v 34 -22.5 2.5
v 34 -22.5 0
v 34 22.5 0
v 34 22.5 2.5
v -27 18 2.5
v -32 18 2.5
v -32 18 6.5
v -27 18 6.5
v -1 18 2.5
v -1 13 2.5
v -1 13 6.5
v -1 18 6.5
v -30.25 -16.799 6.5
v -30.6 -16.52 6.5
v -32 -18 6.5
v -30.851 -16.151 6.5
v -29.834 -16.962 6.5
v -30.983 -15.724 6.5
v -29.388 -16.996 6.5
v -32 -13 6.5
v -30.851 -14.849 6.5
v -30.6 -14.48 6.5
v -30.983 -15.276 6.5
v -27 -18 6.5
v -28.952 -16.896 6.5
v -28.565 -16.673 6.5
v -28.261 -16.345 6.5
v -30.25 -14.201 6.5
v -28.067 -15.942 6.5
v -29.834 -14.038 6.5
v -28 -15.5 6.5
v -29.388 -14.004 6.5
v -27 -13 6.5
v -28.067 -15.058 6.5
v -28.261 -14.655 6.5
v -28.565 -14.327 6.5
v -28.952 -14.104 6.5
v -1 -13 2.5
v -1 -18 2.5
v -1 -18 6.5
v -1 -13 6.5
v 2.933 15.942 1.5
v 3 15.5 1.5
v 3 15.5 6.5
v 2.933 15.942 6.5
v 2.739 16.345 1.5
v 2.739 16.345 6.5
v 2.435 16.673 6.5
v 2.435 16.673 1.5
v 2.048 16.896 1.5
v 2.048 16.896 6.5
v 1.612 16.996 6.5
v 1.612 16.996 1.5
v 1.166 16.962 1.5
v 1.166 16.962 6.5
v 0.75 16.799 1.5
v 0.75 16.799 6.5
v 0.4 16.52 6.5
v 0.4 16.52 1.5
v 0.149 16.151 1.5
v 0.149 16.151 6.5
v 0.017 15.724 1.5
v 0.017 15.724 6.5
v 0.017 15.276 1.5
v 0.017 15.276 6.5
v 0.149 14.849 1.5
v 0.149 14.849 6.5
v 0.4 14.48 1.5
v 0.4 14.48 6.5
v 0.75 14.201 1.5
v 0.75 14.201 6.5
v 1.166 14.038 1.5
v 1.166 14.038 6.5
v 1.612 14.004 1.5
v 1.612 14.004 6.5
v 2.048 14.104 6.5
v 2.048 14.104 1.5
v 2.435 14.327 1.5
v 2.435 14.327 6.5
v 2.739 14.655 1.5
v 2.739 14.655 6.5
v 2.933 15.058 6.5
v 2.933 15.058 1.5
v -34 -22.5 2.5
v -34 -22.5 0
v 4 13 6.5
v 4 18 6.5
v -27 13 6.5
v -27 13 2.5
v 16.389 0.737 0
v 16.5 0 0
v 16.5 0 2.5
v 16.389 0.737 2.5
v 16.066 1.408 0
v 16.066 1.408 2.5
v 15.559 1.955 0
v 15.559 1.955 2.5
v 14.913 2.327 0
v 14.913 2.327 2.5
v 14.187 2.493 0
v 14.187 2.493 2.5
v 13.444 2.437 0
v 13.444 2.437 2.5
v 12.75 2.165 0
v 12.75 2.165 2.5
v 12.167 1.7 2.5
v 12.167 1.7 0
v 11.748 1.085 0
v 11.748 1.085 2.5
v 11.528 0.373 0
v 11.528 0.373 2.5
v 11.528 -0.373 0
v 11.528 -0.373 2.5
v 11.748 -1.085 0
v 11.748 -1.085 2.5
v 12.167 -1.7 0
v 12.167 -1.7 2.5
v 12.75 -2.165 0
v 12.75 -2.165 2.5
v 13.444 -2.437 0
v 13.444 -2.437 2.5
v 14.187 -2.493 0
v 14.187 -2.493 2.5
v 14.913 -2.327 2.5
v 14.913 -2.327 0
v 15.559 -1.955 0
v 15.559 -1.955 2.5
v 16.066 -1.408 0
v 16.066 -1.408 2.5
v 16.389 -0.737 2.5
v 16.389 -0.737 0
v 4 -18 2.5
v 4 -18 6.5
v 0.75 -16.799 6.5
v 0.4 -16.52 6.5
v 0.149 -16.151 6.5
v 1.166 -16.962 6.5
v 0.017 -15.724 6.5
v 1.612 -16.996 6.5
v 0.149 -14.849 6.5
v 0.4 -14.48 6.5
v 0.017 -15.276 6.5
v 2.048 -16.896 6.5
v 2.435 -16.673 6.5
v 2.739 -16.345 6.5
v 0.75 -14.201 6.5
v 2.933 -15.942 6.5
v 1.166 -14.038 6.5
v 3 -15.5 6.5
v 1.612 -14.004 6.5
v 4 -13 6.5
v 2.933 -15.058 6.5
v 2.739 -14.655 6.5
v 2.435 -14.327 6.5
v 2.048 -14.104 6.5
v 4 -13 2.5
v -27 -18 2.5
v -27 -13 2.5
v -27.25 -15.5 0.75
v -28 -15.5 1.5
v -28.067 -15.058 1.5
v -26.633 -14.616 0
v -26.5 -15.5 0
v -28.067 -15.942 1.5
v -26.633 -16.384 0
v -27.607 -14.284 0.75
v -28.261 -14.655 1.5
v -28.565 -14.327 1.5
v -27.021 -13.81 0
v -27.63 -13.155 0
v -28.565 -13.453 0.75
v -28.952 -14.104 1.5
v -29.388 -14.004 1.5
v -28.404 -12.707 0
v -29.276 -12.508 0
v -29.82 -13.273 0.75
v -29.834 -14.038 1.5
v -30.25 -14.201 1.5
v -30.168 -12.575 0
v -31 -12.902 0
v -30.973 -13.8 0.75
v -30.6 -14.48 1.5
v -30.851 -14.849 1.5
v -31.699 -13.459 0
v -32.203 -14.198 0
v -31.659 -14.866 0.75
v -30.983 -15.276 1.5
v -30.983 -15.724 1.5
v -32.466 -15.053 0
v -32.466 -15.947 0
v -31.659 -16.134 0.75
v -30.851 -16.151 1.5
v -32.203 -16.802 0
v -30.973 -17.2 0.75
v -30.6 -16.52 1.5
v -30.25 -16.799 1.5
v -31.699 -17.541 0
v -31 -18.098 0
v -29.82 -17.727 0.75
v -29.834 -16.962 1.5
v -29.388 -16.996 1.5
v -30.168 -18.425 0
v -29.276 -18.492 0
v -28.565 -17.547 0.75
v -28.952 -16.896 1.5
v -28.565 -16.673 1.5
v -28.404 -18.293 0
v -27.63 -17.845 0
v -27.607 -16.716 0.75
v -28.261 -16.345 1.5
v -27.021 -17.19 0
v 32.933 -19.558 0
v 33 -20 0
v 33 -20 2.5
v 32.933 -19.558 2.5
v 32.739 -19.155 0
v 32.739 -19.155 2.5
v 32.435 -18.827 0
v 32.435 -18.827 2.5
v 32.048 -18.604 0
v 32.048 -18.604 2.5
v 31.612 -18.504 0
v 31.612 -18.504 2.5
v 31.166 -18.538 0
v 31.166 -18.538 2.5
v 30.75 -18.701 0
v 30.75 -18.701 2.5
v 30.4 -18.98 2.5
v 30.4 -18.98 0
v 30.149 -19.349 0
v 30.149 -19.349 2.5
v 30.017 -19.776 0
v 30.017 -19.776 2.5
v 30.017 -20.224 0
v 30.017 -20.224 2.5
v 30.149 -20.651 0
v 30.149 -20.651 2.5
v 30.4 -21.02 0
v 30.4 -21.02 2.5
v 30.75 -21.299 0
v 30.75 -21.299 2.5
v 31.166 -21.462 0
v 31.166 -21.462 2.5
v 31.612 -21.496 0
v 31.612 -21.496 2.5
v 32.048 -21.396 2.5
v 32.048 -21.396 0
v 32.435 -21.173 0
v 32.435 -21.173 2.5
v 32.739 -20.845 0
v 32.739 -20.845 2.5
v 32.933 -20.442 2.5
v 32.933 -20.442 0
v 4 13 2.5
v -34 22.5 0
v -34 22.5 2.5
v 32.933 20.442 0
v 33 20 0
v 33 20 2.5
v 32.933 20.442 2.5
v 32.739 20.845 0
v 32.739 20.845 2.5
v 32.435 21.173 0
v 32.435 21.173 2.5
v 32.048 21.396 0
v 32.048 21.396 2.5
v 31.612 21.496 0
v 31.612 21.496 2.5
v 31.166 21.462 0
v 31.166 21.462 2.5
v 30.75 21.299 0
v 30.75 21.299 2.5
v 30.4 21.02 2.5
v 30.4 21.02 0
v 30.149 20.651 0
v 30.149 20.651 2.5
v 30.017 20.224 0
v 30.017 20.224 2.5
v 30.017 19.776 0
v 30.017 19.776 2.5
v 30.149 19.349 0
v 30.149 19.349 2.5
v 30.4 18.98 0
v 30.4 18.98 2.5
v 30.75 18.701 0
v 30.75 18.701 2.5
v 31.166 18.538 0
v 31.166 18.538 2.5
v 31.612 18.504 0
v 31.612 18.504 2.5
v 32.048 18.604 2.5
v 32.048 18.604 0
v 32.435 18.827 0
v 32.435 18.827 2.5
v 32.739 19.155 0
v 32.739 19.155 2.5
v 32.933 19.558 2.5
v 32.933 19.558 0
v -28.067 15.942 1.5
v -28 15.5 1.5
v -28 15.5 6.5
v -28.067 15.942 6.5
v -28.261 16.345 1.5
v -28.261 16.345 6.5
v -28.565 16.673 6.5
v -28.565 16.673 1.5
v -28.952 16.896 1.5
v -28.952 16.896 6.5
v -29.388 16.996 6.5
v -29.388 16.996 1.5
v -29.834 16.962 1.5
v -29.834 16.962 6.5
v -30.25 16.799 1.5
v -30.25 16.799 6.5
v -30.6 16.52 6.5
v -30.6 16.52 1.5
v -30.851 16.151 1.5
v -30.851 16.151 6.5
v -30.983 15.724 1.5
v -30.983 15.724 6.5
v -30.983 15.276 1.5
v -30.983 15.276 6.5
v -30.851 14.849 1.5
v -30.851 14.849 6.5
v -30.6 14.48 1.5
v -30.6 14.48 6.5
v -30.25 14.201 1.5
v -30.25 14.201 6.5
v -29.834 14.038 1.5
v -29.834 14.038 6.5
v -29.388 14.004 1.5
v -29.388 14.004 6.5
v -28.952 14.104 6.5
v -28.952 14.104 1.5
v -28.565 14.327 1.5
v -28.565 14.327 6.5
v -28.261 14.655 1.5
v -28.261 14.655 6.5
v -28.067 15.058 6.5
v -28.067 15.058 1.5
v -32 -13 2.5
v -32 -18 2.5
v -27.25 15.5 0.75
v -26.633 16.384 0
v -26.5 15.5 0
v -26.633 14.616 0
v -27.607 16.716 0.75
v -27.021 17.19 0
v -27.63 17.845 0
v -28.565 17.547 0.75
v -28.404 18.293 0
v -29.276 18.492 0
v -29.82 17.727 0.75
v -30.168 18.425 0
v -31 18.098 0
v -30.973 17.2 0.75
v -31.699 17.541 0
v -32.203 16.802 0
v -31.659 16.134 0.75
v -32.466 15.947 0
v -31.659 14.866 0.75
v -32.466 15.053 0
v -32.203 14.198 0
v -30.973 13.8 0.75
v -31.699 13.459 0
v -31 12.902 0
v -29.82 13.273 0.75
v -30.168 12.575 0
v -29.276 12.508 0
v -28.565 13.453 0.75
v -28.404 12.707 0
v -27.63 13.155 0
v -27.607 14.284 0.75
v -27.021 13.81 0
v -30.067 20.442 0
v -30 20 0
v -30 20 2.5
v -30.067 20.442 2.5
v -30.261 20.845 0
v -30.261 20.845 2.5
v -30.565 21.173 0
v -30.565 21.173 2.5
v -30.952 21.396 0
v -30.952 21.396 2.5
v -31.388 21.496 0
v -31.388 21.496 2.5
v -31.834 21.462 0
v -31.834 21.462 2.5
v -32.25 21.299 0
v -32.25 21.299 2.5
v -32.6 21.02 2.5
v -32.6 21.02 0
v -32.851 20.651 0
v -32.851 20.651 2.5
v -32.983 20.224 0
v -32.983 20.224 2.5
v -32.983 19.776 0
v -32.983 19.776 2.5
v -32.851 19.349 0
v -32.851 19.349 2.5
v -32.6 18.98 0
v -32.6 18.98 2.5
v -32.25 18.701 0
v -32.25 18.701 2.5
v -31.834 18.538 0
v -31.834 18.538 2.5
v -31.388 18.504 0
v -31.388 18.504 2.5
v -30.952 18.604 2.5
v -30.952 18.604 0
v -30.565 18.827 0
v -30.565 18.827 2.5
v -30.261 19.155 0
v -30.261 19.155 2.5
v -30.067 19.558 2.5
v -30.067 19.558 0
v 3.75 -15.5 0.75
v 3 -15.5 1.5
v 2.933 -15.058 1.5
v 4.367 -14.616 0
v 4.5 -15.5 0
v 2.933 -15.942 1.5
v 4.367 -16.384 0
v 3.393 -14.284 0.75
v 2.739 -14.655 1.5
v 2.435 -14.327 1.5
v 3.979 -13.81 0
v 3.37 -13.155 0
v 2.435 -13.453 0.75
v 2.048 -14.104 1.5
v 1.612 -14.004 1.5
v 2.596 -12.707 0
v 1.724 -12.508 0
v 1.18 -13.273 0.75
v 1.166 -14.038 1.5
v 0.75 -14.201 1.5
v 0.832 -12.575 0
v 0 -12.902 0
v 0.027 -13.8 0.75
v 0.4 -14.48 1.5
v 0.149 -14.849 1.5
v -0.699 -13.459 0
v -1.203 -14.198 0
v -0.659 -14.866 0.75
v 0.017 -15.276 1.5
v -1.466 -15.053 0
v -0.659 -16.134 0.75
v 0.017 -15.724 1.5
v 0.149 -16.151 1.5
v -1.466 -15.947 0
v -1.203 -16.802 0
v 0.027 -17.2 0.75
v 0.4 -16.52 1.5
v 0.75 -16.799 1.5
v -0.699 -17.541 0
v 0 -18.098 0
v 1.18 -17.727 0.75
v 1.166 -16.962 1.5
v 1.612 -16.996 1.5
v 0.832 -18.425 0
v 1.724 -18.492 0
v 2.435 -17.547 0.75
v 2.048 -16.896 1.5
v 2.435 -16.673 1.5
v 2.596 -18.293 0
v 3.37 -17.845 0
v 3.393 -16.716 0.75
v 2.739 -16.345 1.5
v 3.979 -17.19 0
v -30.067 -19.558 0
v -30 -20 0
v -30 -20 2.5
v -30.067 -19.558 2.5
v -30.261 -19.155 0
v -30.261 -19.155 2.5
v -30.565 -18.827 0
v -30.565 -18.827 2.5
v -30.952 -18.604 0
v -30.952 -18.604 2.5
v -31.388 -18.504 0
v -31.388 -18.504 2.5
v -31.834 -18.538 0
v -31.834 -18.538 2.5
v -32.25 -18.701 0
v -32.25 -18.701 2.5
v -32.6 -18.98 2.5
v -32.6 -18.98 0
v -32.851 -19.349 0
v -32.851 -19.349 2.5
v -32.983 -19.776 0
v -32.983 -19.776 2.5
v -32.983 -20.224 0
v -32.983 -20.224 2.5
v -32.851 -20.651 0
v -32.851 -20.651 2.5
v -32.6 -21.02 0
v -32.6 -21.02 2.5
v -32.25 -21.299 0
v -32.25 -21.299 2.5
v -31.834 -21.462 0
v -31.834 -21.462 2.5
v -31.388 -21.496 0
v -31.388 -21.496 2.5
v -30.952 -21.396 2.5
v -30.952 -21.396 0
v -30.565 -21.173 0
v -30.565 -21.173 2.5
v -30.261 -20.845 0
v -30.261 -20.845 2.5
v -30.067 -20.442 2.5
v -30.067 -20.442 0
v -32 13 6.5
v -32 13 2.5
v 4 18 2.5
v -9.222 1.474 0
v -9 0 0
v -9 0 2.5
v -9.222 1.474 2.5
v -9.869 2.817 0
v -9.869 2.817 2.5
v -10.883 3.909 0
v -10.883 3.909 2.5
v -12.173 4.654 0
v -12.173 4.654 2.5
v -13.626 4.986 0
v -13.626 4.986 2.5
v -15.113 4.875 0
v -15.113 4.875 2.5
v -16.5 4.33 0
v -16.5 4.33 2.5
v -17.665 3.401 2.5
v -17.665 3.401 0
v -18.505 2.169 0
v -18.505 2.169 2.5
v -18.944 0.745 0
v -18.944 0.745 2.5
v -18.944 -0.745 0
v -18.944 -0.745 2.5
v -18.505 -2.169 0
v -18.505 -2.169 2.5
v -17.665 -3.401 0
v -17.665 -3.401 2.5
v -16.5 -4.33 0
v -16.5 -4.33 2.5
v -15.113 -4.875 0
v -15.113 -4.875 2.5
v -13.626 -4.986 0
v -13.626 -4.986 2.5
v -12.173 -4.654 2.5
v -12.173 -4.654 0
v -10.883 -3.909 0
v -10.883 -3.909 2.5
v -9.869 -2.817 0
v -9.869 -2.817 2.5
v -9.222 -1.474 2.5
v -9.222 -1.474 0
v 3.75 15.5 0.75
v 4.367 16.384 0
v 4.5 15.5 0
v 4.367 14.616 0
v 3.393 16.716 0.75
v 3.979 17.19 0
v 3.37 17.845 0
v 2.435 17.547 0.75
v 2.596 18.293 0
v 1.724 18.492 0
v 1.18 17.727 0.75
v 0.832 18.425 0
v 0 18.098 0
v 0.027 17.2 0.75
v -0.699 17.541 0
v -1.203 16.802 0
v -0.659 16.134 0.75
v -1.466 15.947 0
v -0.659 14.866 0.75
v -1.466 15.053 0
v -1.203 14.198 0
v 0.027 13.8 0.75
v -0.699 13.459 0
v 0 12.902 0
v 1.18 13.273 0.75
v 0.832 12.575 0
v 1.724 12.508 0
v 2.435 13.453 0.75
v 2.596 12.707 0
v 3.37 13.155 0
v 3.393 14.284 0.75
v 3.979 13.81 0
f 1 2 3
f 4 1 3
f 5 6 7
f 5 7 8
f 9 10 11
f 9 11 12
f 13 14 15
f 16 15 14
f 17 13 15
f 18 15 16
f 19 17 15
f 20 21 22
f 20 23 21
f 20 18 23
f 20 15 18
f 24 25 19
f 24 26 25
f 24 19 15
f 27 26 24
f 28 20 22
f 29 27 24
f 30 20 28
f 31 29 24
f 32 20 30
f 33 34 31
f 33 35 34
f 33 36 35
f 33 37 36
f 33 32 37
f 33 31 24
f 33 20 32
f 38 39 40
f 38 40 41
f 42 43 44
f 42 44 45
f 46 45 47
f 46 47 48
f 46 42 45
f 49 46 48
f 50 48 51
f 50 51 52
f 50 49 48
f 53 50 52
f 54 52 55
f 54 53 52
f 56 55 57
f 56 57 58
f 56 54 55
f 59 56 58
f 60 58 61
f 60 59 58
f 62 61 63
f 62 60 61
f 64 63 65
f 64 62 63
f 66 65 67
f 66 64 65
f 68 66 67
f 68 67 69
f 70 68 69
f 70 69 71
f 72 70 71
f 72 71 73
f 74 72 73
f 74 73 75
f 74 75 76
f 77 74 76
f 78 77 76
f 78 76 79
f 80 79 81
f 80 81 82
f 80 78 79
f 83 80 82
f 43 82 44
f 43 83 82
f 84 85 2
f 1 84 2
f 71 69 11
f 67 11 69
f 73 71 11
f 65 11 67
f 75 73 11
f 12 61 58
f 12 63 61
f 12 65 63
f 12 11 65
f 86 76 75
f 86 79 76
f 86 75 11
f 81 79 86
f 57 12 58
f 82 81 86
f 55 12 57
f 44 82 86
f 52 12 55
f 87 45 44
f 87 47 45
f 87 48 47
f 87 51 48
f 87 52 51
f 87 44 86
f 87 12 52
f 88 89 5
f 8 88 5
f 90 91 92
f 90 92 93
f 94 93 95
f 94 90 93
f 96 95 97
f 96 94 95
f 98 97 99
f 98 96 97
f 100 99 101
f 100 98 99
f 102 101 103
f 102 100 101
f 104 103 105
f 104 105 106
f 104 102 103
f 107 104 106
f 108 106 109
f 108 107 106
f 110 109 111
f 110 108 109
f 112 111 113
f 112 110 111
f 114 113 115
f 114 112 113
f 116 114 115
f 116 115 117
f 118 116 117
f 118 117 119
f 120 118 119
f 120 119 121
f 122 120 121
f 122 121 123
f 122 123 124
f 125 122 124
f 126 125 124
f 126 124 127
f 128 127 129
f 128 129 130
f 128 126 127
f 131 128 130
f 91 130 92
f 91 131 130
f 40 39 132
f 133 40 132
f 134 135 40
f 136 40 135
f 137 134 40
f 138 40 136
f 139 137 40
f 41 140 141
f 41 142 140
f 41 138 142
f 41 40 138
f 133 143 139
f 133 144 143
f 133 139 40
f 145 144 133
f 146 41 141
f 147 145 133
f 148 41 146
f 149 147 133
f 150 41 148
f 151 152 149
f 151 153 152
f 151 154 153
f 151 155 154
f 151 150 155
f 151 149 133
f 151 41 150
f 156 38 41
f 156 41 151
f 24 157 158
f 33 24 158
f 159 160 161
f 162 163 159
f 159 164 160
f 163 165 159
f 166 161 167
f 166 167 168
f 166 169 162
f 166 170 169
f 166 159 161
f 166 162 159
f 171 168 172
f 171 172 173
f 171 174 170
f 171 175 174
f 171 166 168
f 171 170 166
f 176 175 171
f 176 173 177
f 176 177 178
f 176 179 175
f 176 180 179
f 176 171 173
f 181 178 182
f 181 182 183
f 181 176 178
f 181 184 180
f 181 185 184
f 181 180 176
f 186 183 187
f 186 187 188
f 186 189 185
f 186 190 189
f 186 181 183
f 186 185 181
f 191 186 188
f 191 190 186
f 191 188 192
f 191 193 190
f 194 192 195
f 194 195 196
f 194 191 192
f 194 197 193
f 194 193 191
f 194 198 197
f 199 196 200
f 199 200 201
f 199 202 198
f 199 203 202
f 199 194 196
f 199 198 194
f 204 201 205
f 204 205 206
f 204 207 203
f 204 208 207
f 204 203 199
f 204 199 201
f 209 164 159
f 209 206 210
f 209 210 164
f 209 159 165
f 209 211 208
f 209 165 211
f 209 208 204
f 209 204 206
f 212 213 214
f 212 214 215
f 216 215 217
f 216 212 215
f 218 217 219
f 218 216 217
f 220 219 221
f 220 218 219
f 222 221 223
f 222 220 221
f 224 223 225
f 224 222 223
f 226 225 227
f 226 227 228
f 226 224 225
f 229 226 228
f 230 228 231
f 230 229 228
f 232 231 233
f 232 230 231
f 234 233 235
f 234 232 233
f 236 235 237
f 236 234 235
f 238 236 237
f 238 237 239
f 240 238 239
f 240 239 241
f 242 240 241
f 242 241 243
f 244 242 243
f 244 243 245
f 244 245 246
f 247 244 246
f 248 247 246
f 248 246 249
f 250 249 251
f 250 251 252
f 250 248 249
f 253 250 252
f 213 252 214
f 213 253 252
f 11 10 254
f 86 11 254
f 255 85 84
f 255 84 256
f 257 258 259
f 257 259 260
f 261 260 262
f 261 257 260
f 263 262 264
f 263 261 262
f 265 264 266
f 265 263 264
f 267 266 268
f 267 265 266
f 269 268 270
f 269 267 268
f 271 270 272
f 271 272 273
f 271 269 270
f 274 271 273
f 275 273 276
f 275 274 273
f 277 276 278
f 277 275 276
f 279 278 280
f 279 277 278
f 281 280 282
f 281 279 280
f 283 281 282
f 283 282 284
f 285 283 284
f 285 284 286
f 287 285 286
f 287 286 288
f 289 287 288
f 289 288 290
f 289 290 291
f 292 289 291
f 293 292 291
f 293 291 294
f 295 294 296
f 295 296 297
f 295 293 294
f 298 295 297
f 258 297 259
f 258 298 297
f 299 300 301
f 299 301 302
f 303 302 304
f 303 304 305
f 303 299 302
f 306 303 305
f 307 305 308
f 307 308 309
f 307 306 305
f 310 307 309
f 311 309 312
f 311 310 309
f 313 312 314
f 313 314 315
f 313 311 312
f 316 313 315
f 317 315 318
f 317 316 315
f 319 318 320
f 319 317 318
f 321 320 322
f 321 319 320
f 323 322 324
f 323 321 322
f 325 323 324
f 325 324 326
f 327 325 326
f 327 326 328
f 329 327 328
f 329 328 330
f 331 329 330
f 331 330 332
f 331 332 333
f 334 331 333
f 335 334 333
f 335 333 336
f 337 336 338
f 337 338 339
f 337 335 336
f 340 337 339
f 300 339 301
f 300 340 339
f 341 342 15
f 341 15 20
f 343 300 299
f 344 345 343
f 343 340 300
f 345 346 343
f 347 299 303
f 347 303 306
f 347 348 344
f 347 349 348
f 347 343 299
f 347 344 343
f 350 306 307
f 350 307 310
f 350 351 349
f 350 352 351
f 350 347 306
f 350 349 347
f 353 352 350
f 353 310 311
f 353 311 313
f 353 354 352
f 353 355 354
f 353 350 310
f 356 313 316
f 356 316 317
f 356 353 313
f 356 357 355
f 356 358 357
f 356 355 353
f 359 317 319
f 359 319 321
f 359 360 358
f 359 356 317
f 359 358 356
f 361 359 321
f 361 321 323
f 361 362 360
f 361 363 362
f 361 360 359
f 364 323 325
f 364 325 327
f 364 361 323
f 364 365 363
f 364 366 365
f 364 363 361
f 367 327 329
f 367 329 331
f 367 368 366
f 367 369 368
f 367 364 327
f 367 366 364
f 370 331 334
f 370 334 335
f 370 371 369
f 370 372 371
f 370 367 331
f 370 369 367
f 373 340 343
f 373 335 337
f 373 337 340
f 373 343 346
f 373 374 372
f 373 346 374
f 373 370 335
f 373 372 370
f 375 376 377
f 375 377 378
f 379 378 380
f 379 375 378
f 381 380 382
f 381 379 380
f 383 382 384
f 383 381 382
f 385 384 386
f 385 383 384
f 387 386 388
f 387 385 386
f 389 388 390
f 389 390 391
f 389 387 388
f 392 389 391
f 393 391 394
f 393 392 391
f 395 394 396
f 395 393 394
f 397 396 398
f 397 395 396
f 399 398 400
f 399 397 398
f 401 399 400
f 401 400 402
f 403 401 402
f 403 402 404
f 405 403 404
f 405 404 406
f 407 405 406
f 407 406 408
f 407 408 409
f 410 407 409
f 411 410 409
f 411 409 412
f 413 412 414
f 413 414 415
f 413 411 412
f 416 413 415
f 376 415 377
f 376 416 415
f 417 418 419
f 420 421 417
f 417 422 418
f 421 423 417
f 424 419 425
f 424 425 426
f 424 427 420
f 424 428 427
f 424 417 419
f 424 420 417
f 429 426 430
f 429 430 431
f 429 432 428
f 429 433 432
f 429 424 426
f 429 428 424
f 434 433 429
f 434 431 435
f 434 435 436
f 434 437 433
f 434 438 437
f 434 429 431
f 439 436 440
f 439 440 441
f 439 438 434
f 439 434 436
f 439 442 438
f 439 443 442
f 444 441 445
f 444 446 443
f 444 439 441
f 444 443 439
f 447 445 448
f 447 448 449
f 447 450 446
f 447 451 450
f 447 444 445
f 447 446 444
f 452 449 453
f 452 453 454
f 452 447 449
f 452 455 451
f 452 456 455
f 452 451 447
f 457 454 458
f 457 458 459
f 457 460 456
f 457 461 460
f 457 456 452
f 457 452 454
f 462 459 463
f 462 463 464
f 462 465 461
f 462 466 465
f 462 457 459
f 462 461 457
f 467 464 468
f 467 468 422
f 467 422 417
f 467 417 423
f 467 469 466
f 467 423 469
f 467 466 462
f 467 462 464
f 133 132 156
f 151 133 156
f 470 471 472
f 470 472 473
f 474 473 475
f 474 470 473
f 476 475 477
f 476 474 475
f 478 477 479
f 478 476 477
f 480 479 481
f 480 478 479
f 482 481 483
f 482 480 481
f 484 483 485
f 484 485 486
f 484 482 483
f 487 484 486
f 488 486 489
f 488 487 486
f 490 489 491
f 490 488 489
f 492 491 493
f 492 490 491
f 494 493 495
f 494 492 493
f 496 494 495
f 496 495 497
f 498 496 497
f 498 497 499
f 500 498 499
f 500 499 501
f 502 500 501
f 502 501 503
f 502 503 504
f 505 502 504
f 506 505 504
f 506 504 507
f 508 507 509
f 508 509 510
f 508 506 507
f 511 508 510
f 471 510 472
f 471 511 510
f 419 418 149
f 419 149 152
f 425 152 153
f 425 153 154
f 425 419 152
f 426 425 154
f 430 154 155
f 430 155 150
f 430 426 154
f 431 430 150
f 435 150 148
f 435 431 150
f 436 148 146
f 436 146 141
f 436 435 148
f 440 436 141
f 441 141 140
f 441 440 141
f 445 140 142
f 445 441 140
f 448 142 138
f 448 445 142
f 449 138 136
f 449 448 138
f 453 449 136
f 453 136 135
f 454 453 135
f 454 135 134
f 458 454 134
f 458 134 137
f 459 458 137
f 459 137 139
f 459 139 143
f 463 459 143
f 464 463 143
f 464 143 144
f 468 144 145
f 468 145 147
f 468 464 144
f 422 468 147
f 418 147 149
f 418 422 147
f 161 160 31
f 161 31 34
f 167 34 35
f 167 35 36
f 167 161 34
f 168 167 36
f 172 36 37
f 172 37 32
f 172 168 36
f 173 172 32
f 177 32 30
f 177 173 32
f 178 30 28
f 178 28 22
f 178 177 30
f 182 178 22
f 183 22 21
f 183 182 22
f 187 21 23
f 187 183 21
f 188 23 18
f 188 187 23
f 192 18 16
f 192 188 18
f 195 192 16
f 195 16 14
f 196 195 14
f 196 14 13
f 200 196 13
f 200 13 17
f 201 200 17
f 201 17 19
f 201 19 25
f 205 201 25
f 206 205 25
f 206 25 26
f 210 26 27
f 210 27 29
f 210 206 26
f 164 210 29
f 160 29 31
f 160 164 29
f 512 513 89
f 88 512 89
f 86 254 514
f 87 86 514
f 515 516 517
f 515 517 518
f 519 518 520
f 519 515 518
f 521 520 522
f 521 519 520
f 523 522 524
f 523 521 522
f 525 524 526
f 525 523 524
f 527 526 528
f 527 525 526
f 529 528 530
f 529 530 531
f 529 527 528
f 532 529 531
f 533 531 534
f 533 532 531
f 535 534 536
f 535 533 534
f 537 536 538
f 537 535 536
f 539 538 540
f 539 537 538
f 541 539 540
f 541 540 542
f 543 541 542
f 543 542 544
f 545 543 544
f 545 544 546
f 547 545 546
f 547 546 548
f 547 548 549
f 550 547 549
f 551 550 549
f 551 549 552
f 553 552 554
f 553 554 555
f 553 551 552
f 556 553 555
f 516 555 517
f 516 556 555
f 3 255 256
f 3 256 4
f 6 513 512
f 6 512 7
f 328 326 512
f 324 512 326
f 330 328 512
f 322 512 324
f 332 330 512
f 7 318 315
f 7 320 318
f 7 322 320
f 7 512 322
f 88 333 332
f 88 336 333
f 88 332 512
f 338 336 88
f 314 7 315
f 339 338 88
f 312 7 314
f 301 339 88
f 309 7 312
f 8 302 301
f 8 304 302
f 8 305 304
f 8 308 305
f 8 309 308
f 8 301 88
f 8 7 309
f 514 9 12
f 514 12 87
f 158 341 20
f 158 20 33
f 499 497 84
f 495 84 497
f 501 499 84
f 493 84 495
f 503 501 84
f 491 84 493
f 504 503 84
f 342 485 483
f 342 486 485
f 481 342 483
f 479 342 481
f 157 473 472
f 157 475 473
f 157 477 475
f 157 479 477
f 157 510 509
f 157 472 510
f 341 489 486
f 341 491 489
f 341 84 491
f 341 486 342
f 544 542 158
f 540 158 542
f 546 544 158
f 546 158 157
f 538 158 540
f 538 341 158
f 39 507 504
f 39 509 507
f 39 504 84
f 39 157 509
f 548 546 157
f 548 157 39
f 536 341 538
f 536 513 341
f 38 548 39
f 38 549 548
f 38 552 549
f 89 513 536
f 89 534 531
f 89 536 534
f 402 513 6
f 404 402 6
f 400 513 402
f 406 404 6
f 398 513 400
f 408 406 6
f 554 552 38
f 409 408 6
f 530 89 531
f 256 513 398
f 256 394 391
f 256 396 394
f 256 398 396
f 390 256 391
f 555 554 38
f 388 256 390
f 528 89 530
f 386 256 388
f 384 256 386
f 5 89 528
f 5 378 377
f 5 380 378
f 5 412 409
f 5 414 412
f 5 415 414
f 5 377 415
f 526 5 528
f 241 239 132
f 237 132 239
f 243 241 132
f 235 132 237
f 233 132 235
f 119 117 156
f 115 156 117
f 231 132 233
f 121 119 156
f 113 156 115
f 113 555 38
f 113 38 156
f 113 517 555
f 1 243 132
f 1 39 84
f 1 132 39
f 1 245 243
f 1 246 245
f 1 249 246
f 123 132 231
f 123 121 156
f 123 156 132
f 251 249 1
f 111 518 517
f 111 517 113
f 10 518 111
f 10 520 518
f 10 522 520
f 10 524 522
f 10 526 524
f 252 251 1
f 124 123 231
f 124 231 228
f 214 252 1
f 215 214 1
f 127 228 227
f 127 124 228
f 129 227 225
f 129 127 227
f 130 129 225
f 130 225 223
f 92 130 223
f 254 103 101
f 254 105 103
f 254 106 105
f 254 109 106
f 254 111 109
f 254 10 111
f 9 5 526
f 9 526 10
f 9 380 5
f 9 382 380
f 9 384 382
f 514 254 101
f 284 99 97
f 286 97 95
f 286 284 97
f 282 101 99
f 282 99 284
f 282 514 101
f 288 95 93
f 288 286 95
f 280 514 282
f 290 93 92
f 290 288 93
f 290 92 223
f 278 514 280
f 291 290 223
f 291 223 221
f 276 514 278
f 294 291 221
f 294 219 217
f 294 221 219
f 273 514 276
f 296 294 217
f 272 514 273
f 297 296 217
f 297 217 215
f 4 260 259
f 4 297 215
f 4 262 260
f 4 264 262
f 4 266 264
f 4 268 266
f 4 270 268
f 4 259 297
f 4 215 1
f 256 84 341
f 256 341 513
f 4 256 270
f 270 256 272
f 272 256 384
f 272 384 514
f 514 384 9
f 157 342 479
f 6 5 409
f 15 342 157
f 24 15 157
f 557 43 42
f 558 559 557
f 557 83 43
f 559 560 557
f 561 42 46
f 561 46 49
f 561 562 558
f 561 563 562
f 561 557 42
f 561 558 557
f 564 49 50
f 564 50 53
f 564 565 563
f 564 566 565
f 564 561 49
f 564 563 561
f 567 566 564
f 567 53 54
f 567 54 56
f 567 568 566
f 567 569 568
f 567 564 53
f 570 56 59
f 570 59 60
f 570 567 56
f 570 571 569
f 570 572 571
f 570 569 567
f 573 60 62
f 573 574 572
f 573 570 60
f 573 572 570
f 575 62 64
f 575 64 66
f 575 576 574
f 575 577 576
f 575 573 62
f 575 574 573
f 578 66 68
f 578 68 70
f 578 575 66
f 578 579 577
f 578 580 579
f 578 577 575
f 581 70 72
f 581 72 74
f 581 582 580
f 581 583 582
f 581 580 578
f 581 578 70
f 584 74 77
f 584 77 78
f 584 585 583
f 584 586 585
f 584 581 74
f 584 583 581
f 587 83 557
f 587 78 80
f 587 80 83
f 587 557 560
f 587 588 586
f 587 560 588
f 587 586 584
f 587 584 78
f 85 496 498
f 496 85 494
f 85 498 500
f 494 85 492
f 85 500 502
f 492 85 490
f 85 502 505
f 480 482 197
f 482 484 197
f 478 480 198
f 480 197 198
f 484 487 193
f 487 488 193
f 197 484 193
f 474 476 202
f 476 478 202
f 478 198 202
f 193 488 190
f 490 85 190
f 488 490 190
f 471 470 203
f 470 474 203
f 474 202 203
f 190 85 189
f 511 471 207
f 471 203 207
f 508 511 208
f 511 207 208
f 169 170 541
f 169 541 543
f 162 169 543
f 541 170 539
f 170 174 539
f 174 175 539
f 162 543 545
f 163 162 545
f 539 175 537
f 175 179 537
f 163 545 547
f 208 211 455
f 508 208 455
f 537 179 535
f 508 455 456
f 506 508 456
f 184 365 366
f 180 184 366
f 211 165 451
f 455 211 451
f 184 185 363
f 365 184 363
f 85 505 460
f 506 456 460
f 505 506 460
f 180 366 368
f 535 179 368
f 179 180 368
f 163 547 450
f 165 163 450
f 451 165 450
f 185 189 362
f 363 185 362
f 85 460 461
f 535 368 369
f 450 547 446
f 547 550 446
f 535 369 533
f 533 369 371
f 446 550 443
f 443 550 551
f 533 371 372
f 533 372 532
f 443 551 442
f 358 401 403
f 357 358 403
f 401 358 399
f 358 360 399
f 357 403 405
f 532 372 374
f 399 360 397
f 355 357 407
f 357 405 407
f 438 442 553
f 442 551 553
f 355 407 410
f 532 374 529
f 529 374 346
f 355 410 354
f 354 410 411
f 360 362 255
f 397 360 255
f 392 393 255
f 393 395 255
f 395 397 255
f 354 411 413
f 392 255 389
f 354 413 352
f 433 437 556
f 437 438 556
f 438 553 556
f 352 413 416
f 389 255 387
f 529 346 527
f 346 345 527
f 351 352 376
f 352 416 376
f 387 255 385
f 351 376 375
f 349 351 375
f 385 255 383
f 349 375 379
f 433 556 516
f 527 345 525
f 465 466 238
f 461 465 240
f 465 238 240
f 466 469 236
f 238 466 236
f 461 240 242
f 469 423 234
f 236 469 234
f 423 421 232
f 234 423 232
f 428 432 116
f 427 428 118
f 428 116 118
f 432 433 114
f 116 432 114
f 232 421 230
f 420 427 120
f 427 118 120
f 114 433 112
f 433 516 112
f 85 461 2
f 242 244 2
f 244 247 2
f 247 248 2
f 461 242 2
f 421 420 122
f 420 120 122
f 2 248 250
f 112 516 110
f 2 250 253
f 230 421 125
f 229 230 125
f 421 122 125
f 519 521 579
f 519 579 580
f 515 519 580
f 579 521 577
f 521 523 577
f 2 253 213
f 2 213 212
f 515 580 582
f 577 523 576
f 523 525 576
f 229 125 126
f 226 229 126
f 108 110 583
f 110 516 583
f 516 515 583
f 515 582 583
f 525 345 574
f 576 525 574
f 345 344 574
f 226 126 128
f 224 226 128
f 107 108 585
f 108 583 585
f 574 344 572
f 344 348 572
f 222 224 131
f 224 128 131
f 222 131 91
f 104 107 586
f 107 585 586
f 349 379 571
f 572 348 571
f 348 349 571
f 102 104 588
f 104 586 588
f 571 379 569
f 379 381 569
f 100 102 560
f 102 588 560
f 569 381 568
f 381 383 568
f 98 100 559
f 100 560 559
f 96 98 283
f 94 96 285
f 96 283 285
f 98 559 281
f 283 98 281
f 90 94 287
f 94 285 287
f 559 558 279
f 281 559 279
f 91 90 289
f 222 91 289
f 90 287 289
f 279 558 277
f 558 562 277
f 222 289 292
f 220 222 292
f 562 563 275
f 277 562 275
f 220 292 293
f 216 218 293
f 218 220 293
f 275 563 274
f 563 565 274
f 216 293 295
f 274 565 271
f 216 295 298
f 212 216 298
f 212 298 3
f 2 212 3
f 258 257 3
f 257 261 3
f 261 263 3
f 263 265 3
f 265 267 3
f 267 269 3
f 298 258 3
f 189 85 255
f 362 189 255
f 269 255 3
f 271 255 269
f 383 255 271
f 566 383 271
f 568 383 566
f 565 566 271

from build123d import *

# Parameters (mm, degrees)
SKICA1_W                 = 68
SKICA1_H                 = 45
SKICA1_R                 = 1.5
SKICA1_R_2               = 5
SKICA1_R_3               = 2.5
P_IDAT_VYSUNUT_M1_DEPTH  = 2.5
SKICA2_W                 = 5
SKICA2_H                 = 5
SKICA2_R                 = 1.5
P_IDAT_VYSUNUT_M2_DEPTH  = 4
ODEBRAT_START            = -2.5
SKICA5_R                 = 1.5
ODEBRAT_VYSUNUT_M1_DEPTH = 2.5
ZKOSEN_1_SIZE            = 1.5


with BuildPart() as part:
    # Skica1 → Přidat vysunutím1 (new body)
    with BuildSketch(Plane.XY):
        Rectangle(SKICA1_W, SKICA1_H)
        with Locations((-31.5, 20)):
            Circle(SKICA1_R, mode=Mode.SUBTRACT)
        with Locations((31.5, 20)):
            Circle(SKICA1_R, mode=Mode.SUBTRACT)
        with Locations((31.5, -20)):
            Circle(SKICA1_R, mode=Mode.SUBTRACT)
        with Locations((-31.5, -20)):
            Circle(SKICA1_R, mode=Mode.SUBTRACT)
        with Locations((-14, 0)):
            Circle(SKICA1_R_2, mode=Mode.SUBTRACT)
        with Locations((14, 0)):
            Circle(SKICA1_R_3, mode=Mode.SUBTRACT)
    extrude(amount=P_IDAT_VYSUNUT_M1_DEPTH)

    # Skica2 → Přidat vysunutím2 (add)
    # profile 1 of 4: a face of its own
    with BuildSketch(Plane.XY.offset(2.5)):
        with Locations((-29.5, 15.5)):
            Rectangle(SKICA2_W, SKICA2_H)
        with Locations((-29.5, 15.5)):
            Circle(SKICA2_R, mode=Mode.SUBTRACT)
    # profile 2 of 4: a face of its own
    with BuildSketch(Plane.XY.offset(2.5)):
        with Locations((1.5, 15.5)):
            Rectangle(SKICA2_W, SKICA2_H)
        with Locations((1.5, 15.5)):
            Circle(SKICA2_R, mode=Mode.SUBTRACT)
    # profile 3 of 4: a face of its own
    with BuildSketch(Plane.XY.offset(2.5)):
        with Locations((1.5, -15.5)):
            Rectangle(SKICA2_W, SKICA2_H)
        with Locations((1.5, -15.5)):
            Circle(SKICA2_R, mode=Mode.SUBTRACT)
    # profile 4 of 4: a face of its own
    with BuildSketch(Plane.XY.offset(2.5)):
        with Locations((-29.5, -15.5)):
            Rectangle(SKICA2_W, SKICA2_H)
        with Locations((-29.5, -15.5)):
            Circle(SKICA2_R, mode=Mode.SUBTRACT)
    extrude(amount=P_IDAT_VYSUNUT_M2_DEPTH)

    # Skica5 → Odebrat vysunutím1 (cut)
    with BuildSketch(Plane.XY.offset(2.5).offset(ODEBRAT_START)):
        with Locations((-29.5, 15.5)):
            Circle(SKICA5_R)
        with Locations((1.5, 15.5)):
            Circle(SKICA5_R)
        with Locations((1.5, -15.5)):
            Circle(SKICA5_R)
        with Locations((-29.5, -15.5)):
            Circle(SKICA5_R)
    extrude(amount=ODEBRAT_VYSUNUT_M1_DEPTH, mode=Mode.SUBTRACT)

    # Zkosení1
    zkosen_1_edges = [part.edges().sort_by_distance(p)[0] for p in [
        (0, -15.5, 0),
        (0, 15.5, 0),
        (-31, 15.5, 0),
        (-31, -15.5, 0),
    ]]
    chamfer(zkosen_1_edges, length=ZKOSEN_1_SIZE)


solid = part.part
